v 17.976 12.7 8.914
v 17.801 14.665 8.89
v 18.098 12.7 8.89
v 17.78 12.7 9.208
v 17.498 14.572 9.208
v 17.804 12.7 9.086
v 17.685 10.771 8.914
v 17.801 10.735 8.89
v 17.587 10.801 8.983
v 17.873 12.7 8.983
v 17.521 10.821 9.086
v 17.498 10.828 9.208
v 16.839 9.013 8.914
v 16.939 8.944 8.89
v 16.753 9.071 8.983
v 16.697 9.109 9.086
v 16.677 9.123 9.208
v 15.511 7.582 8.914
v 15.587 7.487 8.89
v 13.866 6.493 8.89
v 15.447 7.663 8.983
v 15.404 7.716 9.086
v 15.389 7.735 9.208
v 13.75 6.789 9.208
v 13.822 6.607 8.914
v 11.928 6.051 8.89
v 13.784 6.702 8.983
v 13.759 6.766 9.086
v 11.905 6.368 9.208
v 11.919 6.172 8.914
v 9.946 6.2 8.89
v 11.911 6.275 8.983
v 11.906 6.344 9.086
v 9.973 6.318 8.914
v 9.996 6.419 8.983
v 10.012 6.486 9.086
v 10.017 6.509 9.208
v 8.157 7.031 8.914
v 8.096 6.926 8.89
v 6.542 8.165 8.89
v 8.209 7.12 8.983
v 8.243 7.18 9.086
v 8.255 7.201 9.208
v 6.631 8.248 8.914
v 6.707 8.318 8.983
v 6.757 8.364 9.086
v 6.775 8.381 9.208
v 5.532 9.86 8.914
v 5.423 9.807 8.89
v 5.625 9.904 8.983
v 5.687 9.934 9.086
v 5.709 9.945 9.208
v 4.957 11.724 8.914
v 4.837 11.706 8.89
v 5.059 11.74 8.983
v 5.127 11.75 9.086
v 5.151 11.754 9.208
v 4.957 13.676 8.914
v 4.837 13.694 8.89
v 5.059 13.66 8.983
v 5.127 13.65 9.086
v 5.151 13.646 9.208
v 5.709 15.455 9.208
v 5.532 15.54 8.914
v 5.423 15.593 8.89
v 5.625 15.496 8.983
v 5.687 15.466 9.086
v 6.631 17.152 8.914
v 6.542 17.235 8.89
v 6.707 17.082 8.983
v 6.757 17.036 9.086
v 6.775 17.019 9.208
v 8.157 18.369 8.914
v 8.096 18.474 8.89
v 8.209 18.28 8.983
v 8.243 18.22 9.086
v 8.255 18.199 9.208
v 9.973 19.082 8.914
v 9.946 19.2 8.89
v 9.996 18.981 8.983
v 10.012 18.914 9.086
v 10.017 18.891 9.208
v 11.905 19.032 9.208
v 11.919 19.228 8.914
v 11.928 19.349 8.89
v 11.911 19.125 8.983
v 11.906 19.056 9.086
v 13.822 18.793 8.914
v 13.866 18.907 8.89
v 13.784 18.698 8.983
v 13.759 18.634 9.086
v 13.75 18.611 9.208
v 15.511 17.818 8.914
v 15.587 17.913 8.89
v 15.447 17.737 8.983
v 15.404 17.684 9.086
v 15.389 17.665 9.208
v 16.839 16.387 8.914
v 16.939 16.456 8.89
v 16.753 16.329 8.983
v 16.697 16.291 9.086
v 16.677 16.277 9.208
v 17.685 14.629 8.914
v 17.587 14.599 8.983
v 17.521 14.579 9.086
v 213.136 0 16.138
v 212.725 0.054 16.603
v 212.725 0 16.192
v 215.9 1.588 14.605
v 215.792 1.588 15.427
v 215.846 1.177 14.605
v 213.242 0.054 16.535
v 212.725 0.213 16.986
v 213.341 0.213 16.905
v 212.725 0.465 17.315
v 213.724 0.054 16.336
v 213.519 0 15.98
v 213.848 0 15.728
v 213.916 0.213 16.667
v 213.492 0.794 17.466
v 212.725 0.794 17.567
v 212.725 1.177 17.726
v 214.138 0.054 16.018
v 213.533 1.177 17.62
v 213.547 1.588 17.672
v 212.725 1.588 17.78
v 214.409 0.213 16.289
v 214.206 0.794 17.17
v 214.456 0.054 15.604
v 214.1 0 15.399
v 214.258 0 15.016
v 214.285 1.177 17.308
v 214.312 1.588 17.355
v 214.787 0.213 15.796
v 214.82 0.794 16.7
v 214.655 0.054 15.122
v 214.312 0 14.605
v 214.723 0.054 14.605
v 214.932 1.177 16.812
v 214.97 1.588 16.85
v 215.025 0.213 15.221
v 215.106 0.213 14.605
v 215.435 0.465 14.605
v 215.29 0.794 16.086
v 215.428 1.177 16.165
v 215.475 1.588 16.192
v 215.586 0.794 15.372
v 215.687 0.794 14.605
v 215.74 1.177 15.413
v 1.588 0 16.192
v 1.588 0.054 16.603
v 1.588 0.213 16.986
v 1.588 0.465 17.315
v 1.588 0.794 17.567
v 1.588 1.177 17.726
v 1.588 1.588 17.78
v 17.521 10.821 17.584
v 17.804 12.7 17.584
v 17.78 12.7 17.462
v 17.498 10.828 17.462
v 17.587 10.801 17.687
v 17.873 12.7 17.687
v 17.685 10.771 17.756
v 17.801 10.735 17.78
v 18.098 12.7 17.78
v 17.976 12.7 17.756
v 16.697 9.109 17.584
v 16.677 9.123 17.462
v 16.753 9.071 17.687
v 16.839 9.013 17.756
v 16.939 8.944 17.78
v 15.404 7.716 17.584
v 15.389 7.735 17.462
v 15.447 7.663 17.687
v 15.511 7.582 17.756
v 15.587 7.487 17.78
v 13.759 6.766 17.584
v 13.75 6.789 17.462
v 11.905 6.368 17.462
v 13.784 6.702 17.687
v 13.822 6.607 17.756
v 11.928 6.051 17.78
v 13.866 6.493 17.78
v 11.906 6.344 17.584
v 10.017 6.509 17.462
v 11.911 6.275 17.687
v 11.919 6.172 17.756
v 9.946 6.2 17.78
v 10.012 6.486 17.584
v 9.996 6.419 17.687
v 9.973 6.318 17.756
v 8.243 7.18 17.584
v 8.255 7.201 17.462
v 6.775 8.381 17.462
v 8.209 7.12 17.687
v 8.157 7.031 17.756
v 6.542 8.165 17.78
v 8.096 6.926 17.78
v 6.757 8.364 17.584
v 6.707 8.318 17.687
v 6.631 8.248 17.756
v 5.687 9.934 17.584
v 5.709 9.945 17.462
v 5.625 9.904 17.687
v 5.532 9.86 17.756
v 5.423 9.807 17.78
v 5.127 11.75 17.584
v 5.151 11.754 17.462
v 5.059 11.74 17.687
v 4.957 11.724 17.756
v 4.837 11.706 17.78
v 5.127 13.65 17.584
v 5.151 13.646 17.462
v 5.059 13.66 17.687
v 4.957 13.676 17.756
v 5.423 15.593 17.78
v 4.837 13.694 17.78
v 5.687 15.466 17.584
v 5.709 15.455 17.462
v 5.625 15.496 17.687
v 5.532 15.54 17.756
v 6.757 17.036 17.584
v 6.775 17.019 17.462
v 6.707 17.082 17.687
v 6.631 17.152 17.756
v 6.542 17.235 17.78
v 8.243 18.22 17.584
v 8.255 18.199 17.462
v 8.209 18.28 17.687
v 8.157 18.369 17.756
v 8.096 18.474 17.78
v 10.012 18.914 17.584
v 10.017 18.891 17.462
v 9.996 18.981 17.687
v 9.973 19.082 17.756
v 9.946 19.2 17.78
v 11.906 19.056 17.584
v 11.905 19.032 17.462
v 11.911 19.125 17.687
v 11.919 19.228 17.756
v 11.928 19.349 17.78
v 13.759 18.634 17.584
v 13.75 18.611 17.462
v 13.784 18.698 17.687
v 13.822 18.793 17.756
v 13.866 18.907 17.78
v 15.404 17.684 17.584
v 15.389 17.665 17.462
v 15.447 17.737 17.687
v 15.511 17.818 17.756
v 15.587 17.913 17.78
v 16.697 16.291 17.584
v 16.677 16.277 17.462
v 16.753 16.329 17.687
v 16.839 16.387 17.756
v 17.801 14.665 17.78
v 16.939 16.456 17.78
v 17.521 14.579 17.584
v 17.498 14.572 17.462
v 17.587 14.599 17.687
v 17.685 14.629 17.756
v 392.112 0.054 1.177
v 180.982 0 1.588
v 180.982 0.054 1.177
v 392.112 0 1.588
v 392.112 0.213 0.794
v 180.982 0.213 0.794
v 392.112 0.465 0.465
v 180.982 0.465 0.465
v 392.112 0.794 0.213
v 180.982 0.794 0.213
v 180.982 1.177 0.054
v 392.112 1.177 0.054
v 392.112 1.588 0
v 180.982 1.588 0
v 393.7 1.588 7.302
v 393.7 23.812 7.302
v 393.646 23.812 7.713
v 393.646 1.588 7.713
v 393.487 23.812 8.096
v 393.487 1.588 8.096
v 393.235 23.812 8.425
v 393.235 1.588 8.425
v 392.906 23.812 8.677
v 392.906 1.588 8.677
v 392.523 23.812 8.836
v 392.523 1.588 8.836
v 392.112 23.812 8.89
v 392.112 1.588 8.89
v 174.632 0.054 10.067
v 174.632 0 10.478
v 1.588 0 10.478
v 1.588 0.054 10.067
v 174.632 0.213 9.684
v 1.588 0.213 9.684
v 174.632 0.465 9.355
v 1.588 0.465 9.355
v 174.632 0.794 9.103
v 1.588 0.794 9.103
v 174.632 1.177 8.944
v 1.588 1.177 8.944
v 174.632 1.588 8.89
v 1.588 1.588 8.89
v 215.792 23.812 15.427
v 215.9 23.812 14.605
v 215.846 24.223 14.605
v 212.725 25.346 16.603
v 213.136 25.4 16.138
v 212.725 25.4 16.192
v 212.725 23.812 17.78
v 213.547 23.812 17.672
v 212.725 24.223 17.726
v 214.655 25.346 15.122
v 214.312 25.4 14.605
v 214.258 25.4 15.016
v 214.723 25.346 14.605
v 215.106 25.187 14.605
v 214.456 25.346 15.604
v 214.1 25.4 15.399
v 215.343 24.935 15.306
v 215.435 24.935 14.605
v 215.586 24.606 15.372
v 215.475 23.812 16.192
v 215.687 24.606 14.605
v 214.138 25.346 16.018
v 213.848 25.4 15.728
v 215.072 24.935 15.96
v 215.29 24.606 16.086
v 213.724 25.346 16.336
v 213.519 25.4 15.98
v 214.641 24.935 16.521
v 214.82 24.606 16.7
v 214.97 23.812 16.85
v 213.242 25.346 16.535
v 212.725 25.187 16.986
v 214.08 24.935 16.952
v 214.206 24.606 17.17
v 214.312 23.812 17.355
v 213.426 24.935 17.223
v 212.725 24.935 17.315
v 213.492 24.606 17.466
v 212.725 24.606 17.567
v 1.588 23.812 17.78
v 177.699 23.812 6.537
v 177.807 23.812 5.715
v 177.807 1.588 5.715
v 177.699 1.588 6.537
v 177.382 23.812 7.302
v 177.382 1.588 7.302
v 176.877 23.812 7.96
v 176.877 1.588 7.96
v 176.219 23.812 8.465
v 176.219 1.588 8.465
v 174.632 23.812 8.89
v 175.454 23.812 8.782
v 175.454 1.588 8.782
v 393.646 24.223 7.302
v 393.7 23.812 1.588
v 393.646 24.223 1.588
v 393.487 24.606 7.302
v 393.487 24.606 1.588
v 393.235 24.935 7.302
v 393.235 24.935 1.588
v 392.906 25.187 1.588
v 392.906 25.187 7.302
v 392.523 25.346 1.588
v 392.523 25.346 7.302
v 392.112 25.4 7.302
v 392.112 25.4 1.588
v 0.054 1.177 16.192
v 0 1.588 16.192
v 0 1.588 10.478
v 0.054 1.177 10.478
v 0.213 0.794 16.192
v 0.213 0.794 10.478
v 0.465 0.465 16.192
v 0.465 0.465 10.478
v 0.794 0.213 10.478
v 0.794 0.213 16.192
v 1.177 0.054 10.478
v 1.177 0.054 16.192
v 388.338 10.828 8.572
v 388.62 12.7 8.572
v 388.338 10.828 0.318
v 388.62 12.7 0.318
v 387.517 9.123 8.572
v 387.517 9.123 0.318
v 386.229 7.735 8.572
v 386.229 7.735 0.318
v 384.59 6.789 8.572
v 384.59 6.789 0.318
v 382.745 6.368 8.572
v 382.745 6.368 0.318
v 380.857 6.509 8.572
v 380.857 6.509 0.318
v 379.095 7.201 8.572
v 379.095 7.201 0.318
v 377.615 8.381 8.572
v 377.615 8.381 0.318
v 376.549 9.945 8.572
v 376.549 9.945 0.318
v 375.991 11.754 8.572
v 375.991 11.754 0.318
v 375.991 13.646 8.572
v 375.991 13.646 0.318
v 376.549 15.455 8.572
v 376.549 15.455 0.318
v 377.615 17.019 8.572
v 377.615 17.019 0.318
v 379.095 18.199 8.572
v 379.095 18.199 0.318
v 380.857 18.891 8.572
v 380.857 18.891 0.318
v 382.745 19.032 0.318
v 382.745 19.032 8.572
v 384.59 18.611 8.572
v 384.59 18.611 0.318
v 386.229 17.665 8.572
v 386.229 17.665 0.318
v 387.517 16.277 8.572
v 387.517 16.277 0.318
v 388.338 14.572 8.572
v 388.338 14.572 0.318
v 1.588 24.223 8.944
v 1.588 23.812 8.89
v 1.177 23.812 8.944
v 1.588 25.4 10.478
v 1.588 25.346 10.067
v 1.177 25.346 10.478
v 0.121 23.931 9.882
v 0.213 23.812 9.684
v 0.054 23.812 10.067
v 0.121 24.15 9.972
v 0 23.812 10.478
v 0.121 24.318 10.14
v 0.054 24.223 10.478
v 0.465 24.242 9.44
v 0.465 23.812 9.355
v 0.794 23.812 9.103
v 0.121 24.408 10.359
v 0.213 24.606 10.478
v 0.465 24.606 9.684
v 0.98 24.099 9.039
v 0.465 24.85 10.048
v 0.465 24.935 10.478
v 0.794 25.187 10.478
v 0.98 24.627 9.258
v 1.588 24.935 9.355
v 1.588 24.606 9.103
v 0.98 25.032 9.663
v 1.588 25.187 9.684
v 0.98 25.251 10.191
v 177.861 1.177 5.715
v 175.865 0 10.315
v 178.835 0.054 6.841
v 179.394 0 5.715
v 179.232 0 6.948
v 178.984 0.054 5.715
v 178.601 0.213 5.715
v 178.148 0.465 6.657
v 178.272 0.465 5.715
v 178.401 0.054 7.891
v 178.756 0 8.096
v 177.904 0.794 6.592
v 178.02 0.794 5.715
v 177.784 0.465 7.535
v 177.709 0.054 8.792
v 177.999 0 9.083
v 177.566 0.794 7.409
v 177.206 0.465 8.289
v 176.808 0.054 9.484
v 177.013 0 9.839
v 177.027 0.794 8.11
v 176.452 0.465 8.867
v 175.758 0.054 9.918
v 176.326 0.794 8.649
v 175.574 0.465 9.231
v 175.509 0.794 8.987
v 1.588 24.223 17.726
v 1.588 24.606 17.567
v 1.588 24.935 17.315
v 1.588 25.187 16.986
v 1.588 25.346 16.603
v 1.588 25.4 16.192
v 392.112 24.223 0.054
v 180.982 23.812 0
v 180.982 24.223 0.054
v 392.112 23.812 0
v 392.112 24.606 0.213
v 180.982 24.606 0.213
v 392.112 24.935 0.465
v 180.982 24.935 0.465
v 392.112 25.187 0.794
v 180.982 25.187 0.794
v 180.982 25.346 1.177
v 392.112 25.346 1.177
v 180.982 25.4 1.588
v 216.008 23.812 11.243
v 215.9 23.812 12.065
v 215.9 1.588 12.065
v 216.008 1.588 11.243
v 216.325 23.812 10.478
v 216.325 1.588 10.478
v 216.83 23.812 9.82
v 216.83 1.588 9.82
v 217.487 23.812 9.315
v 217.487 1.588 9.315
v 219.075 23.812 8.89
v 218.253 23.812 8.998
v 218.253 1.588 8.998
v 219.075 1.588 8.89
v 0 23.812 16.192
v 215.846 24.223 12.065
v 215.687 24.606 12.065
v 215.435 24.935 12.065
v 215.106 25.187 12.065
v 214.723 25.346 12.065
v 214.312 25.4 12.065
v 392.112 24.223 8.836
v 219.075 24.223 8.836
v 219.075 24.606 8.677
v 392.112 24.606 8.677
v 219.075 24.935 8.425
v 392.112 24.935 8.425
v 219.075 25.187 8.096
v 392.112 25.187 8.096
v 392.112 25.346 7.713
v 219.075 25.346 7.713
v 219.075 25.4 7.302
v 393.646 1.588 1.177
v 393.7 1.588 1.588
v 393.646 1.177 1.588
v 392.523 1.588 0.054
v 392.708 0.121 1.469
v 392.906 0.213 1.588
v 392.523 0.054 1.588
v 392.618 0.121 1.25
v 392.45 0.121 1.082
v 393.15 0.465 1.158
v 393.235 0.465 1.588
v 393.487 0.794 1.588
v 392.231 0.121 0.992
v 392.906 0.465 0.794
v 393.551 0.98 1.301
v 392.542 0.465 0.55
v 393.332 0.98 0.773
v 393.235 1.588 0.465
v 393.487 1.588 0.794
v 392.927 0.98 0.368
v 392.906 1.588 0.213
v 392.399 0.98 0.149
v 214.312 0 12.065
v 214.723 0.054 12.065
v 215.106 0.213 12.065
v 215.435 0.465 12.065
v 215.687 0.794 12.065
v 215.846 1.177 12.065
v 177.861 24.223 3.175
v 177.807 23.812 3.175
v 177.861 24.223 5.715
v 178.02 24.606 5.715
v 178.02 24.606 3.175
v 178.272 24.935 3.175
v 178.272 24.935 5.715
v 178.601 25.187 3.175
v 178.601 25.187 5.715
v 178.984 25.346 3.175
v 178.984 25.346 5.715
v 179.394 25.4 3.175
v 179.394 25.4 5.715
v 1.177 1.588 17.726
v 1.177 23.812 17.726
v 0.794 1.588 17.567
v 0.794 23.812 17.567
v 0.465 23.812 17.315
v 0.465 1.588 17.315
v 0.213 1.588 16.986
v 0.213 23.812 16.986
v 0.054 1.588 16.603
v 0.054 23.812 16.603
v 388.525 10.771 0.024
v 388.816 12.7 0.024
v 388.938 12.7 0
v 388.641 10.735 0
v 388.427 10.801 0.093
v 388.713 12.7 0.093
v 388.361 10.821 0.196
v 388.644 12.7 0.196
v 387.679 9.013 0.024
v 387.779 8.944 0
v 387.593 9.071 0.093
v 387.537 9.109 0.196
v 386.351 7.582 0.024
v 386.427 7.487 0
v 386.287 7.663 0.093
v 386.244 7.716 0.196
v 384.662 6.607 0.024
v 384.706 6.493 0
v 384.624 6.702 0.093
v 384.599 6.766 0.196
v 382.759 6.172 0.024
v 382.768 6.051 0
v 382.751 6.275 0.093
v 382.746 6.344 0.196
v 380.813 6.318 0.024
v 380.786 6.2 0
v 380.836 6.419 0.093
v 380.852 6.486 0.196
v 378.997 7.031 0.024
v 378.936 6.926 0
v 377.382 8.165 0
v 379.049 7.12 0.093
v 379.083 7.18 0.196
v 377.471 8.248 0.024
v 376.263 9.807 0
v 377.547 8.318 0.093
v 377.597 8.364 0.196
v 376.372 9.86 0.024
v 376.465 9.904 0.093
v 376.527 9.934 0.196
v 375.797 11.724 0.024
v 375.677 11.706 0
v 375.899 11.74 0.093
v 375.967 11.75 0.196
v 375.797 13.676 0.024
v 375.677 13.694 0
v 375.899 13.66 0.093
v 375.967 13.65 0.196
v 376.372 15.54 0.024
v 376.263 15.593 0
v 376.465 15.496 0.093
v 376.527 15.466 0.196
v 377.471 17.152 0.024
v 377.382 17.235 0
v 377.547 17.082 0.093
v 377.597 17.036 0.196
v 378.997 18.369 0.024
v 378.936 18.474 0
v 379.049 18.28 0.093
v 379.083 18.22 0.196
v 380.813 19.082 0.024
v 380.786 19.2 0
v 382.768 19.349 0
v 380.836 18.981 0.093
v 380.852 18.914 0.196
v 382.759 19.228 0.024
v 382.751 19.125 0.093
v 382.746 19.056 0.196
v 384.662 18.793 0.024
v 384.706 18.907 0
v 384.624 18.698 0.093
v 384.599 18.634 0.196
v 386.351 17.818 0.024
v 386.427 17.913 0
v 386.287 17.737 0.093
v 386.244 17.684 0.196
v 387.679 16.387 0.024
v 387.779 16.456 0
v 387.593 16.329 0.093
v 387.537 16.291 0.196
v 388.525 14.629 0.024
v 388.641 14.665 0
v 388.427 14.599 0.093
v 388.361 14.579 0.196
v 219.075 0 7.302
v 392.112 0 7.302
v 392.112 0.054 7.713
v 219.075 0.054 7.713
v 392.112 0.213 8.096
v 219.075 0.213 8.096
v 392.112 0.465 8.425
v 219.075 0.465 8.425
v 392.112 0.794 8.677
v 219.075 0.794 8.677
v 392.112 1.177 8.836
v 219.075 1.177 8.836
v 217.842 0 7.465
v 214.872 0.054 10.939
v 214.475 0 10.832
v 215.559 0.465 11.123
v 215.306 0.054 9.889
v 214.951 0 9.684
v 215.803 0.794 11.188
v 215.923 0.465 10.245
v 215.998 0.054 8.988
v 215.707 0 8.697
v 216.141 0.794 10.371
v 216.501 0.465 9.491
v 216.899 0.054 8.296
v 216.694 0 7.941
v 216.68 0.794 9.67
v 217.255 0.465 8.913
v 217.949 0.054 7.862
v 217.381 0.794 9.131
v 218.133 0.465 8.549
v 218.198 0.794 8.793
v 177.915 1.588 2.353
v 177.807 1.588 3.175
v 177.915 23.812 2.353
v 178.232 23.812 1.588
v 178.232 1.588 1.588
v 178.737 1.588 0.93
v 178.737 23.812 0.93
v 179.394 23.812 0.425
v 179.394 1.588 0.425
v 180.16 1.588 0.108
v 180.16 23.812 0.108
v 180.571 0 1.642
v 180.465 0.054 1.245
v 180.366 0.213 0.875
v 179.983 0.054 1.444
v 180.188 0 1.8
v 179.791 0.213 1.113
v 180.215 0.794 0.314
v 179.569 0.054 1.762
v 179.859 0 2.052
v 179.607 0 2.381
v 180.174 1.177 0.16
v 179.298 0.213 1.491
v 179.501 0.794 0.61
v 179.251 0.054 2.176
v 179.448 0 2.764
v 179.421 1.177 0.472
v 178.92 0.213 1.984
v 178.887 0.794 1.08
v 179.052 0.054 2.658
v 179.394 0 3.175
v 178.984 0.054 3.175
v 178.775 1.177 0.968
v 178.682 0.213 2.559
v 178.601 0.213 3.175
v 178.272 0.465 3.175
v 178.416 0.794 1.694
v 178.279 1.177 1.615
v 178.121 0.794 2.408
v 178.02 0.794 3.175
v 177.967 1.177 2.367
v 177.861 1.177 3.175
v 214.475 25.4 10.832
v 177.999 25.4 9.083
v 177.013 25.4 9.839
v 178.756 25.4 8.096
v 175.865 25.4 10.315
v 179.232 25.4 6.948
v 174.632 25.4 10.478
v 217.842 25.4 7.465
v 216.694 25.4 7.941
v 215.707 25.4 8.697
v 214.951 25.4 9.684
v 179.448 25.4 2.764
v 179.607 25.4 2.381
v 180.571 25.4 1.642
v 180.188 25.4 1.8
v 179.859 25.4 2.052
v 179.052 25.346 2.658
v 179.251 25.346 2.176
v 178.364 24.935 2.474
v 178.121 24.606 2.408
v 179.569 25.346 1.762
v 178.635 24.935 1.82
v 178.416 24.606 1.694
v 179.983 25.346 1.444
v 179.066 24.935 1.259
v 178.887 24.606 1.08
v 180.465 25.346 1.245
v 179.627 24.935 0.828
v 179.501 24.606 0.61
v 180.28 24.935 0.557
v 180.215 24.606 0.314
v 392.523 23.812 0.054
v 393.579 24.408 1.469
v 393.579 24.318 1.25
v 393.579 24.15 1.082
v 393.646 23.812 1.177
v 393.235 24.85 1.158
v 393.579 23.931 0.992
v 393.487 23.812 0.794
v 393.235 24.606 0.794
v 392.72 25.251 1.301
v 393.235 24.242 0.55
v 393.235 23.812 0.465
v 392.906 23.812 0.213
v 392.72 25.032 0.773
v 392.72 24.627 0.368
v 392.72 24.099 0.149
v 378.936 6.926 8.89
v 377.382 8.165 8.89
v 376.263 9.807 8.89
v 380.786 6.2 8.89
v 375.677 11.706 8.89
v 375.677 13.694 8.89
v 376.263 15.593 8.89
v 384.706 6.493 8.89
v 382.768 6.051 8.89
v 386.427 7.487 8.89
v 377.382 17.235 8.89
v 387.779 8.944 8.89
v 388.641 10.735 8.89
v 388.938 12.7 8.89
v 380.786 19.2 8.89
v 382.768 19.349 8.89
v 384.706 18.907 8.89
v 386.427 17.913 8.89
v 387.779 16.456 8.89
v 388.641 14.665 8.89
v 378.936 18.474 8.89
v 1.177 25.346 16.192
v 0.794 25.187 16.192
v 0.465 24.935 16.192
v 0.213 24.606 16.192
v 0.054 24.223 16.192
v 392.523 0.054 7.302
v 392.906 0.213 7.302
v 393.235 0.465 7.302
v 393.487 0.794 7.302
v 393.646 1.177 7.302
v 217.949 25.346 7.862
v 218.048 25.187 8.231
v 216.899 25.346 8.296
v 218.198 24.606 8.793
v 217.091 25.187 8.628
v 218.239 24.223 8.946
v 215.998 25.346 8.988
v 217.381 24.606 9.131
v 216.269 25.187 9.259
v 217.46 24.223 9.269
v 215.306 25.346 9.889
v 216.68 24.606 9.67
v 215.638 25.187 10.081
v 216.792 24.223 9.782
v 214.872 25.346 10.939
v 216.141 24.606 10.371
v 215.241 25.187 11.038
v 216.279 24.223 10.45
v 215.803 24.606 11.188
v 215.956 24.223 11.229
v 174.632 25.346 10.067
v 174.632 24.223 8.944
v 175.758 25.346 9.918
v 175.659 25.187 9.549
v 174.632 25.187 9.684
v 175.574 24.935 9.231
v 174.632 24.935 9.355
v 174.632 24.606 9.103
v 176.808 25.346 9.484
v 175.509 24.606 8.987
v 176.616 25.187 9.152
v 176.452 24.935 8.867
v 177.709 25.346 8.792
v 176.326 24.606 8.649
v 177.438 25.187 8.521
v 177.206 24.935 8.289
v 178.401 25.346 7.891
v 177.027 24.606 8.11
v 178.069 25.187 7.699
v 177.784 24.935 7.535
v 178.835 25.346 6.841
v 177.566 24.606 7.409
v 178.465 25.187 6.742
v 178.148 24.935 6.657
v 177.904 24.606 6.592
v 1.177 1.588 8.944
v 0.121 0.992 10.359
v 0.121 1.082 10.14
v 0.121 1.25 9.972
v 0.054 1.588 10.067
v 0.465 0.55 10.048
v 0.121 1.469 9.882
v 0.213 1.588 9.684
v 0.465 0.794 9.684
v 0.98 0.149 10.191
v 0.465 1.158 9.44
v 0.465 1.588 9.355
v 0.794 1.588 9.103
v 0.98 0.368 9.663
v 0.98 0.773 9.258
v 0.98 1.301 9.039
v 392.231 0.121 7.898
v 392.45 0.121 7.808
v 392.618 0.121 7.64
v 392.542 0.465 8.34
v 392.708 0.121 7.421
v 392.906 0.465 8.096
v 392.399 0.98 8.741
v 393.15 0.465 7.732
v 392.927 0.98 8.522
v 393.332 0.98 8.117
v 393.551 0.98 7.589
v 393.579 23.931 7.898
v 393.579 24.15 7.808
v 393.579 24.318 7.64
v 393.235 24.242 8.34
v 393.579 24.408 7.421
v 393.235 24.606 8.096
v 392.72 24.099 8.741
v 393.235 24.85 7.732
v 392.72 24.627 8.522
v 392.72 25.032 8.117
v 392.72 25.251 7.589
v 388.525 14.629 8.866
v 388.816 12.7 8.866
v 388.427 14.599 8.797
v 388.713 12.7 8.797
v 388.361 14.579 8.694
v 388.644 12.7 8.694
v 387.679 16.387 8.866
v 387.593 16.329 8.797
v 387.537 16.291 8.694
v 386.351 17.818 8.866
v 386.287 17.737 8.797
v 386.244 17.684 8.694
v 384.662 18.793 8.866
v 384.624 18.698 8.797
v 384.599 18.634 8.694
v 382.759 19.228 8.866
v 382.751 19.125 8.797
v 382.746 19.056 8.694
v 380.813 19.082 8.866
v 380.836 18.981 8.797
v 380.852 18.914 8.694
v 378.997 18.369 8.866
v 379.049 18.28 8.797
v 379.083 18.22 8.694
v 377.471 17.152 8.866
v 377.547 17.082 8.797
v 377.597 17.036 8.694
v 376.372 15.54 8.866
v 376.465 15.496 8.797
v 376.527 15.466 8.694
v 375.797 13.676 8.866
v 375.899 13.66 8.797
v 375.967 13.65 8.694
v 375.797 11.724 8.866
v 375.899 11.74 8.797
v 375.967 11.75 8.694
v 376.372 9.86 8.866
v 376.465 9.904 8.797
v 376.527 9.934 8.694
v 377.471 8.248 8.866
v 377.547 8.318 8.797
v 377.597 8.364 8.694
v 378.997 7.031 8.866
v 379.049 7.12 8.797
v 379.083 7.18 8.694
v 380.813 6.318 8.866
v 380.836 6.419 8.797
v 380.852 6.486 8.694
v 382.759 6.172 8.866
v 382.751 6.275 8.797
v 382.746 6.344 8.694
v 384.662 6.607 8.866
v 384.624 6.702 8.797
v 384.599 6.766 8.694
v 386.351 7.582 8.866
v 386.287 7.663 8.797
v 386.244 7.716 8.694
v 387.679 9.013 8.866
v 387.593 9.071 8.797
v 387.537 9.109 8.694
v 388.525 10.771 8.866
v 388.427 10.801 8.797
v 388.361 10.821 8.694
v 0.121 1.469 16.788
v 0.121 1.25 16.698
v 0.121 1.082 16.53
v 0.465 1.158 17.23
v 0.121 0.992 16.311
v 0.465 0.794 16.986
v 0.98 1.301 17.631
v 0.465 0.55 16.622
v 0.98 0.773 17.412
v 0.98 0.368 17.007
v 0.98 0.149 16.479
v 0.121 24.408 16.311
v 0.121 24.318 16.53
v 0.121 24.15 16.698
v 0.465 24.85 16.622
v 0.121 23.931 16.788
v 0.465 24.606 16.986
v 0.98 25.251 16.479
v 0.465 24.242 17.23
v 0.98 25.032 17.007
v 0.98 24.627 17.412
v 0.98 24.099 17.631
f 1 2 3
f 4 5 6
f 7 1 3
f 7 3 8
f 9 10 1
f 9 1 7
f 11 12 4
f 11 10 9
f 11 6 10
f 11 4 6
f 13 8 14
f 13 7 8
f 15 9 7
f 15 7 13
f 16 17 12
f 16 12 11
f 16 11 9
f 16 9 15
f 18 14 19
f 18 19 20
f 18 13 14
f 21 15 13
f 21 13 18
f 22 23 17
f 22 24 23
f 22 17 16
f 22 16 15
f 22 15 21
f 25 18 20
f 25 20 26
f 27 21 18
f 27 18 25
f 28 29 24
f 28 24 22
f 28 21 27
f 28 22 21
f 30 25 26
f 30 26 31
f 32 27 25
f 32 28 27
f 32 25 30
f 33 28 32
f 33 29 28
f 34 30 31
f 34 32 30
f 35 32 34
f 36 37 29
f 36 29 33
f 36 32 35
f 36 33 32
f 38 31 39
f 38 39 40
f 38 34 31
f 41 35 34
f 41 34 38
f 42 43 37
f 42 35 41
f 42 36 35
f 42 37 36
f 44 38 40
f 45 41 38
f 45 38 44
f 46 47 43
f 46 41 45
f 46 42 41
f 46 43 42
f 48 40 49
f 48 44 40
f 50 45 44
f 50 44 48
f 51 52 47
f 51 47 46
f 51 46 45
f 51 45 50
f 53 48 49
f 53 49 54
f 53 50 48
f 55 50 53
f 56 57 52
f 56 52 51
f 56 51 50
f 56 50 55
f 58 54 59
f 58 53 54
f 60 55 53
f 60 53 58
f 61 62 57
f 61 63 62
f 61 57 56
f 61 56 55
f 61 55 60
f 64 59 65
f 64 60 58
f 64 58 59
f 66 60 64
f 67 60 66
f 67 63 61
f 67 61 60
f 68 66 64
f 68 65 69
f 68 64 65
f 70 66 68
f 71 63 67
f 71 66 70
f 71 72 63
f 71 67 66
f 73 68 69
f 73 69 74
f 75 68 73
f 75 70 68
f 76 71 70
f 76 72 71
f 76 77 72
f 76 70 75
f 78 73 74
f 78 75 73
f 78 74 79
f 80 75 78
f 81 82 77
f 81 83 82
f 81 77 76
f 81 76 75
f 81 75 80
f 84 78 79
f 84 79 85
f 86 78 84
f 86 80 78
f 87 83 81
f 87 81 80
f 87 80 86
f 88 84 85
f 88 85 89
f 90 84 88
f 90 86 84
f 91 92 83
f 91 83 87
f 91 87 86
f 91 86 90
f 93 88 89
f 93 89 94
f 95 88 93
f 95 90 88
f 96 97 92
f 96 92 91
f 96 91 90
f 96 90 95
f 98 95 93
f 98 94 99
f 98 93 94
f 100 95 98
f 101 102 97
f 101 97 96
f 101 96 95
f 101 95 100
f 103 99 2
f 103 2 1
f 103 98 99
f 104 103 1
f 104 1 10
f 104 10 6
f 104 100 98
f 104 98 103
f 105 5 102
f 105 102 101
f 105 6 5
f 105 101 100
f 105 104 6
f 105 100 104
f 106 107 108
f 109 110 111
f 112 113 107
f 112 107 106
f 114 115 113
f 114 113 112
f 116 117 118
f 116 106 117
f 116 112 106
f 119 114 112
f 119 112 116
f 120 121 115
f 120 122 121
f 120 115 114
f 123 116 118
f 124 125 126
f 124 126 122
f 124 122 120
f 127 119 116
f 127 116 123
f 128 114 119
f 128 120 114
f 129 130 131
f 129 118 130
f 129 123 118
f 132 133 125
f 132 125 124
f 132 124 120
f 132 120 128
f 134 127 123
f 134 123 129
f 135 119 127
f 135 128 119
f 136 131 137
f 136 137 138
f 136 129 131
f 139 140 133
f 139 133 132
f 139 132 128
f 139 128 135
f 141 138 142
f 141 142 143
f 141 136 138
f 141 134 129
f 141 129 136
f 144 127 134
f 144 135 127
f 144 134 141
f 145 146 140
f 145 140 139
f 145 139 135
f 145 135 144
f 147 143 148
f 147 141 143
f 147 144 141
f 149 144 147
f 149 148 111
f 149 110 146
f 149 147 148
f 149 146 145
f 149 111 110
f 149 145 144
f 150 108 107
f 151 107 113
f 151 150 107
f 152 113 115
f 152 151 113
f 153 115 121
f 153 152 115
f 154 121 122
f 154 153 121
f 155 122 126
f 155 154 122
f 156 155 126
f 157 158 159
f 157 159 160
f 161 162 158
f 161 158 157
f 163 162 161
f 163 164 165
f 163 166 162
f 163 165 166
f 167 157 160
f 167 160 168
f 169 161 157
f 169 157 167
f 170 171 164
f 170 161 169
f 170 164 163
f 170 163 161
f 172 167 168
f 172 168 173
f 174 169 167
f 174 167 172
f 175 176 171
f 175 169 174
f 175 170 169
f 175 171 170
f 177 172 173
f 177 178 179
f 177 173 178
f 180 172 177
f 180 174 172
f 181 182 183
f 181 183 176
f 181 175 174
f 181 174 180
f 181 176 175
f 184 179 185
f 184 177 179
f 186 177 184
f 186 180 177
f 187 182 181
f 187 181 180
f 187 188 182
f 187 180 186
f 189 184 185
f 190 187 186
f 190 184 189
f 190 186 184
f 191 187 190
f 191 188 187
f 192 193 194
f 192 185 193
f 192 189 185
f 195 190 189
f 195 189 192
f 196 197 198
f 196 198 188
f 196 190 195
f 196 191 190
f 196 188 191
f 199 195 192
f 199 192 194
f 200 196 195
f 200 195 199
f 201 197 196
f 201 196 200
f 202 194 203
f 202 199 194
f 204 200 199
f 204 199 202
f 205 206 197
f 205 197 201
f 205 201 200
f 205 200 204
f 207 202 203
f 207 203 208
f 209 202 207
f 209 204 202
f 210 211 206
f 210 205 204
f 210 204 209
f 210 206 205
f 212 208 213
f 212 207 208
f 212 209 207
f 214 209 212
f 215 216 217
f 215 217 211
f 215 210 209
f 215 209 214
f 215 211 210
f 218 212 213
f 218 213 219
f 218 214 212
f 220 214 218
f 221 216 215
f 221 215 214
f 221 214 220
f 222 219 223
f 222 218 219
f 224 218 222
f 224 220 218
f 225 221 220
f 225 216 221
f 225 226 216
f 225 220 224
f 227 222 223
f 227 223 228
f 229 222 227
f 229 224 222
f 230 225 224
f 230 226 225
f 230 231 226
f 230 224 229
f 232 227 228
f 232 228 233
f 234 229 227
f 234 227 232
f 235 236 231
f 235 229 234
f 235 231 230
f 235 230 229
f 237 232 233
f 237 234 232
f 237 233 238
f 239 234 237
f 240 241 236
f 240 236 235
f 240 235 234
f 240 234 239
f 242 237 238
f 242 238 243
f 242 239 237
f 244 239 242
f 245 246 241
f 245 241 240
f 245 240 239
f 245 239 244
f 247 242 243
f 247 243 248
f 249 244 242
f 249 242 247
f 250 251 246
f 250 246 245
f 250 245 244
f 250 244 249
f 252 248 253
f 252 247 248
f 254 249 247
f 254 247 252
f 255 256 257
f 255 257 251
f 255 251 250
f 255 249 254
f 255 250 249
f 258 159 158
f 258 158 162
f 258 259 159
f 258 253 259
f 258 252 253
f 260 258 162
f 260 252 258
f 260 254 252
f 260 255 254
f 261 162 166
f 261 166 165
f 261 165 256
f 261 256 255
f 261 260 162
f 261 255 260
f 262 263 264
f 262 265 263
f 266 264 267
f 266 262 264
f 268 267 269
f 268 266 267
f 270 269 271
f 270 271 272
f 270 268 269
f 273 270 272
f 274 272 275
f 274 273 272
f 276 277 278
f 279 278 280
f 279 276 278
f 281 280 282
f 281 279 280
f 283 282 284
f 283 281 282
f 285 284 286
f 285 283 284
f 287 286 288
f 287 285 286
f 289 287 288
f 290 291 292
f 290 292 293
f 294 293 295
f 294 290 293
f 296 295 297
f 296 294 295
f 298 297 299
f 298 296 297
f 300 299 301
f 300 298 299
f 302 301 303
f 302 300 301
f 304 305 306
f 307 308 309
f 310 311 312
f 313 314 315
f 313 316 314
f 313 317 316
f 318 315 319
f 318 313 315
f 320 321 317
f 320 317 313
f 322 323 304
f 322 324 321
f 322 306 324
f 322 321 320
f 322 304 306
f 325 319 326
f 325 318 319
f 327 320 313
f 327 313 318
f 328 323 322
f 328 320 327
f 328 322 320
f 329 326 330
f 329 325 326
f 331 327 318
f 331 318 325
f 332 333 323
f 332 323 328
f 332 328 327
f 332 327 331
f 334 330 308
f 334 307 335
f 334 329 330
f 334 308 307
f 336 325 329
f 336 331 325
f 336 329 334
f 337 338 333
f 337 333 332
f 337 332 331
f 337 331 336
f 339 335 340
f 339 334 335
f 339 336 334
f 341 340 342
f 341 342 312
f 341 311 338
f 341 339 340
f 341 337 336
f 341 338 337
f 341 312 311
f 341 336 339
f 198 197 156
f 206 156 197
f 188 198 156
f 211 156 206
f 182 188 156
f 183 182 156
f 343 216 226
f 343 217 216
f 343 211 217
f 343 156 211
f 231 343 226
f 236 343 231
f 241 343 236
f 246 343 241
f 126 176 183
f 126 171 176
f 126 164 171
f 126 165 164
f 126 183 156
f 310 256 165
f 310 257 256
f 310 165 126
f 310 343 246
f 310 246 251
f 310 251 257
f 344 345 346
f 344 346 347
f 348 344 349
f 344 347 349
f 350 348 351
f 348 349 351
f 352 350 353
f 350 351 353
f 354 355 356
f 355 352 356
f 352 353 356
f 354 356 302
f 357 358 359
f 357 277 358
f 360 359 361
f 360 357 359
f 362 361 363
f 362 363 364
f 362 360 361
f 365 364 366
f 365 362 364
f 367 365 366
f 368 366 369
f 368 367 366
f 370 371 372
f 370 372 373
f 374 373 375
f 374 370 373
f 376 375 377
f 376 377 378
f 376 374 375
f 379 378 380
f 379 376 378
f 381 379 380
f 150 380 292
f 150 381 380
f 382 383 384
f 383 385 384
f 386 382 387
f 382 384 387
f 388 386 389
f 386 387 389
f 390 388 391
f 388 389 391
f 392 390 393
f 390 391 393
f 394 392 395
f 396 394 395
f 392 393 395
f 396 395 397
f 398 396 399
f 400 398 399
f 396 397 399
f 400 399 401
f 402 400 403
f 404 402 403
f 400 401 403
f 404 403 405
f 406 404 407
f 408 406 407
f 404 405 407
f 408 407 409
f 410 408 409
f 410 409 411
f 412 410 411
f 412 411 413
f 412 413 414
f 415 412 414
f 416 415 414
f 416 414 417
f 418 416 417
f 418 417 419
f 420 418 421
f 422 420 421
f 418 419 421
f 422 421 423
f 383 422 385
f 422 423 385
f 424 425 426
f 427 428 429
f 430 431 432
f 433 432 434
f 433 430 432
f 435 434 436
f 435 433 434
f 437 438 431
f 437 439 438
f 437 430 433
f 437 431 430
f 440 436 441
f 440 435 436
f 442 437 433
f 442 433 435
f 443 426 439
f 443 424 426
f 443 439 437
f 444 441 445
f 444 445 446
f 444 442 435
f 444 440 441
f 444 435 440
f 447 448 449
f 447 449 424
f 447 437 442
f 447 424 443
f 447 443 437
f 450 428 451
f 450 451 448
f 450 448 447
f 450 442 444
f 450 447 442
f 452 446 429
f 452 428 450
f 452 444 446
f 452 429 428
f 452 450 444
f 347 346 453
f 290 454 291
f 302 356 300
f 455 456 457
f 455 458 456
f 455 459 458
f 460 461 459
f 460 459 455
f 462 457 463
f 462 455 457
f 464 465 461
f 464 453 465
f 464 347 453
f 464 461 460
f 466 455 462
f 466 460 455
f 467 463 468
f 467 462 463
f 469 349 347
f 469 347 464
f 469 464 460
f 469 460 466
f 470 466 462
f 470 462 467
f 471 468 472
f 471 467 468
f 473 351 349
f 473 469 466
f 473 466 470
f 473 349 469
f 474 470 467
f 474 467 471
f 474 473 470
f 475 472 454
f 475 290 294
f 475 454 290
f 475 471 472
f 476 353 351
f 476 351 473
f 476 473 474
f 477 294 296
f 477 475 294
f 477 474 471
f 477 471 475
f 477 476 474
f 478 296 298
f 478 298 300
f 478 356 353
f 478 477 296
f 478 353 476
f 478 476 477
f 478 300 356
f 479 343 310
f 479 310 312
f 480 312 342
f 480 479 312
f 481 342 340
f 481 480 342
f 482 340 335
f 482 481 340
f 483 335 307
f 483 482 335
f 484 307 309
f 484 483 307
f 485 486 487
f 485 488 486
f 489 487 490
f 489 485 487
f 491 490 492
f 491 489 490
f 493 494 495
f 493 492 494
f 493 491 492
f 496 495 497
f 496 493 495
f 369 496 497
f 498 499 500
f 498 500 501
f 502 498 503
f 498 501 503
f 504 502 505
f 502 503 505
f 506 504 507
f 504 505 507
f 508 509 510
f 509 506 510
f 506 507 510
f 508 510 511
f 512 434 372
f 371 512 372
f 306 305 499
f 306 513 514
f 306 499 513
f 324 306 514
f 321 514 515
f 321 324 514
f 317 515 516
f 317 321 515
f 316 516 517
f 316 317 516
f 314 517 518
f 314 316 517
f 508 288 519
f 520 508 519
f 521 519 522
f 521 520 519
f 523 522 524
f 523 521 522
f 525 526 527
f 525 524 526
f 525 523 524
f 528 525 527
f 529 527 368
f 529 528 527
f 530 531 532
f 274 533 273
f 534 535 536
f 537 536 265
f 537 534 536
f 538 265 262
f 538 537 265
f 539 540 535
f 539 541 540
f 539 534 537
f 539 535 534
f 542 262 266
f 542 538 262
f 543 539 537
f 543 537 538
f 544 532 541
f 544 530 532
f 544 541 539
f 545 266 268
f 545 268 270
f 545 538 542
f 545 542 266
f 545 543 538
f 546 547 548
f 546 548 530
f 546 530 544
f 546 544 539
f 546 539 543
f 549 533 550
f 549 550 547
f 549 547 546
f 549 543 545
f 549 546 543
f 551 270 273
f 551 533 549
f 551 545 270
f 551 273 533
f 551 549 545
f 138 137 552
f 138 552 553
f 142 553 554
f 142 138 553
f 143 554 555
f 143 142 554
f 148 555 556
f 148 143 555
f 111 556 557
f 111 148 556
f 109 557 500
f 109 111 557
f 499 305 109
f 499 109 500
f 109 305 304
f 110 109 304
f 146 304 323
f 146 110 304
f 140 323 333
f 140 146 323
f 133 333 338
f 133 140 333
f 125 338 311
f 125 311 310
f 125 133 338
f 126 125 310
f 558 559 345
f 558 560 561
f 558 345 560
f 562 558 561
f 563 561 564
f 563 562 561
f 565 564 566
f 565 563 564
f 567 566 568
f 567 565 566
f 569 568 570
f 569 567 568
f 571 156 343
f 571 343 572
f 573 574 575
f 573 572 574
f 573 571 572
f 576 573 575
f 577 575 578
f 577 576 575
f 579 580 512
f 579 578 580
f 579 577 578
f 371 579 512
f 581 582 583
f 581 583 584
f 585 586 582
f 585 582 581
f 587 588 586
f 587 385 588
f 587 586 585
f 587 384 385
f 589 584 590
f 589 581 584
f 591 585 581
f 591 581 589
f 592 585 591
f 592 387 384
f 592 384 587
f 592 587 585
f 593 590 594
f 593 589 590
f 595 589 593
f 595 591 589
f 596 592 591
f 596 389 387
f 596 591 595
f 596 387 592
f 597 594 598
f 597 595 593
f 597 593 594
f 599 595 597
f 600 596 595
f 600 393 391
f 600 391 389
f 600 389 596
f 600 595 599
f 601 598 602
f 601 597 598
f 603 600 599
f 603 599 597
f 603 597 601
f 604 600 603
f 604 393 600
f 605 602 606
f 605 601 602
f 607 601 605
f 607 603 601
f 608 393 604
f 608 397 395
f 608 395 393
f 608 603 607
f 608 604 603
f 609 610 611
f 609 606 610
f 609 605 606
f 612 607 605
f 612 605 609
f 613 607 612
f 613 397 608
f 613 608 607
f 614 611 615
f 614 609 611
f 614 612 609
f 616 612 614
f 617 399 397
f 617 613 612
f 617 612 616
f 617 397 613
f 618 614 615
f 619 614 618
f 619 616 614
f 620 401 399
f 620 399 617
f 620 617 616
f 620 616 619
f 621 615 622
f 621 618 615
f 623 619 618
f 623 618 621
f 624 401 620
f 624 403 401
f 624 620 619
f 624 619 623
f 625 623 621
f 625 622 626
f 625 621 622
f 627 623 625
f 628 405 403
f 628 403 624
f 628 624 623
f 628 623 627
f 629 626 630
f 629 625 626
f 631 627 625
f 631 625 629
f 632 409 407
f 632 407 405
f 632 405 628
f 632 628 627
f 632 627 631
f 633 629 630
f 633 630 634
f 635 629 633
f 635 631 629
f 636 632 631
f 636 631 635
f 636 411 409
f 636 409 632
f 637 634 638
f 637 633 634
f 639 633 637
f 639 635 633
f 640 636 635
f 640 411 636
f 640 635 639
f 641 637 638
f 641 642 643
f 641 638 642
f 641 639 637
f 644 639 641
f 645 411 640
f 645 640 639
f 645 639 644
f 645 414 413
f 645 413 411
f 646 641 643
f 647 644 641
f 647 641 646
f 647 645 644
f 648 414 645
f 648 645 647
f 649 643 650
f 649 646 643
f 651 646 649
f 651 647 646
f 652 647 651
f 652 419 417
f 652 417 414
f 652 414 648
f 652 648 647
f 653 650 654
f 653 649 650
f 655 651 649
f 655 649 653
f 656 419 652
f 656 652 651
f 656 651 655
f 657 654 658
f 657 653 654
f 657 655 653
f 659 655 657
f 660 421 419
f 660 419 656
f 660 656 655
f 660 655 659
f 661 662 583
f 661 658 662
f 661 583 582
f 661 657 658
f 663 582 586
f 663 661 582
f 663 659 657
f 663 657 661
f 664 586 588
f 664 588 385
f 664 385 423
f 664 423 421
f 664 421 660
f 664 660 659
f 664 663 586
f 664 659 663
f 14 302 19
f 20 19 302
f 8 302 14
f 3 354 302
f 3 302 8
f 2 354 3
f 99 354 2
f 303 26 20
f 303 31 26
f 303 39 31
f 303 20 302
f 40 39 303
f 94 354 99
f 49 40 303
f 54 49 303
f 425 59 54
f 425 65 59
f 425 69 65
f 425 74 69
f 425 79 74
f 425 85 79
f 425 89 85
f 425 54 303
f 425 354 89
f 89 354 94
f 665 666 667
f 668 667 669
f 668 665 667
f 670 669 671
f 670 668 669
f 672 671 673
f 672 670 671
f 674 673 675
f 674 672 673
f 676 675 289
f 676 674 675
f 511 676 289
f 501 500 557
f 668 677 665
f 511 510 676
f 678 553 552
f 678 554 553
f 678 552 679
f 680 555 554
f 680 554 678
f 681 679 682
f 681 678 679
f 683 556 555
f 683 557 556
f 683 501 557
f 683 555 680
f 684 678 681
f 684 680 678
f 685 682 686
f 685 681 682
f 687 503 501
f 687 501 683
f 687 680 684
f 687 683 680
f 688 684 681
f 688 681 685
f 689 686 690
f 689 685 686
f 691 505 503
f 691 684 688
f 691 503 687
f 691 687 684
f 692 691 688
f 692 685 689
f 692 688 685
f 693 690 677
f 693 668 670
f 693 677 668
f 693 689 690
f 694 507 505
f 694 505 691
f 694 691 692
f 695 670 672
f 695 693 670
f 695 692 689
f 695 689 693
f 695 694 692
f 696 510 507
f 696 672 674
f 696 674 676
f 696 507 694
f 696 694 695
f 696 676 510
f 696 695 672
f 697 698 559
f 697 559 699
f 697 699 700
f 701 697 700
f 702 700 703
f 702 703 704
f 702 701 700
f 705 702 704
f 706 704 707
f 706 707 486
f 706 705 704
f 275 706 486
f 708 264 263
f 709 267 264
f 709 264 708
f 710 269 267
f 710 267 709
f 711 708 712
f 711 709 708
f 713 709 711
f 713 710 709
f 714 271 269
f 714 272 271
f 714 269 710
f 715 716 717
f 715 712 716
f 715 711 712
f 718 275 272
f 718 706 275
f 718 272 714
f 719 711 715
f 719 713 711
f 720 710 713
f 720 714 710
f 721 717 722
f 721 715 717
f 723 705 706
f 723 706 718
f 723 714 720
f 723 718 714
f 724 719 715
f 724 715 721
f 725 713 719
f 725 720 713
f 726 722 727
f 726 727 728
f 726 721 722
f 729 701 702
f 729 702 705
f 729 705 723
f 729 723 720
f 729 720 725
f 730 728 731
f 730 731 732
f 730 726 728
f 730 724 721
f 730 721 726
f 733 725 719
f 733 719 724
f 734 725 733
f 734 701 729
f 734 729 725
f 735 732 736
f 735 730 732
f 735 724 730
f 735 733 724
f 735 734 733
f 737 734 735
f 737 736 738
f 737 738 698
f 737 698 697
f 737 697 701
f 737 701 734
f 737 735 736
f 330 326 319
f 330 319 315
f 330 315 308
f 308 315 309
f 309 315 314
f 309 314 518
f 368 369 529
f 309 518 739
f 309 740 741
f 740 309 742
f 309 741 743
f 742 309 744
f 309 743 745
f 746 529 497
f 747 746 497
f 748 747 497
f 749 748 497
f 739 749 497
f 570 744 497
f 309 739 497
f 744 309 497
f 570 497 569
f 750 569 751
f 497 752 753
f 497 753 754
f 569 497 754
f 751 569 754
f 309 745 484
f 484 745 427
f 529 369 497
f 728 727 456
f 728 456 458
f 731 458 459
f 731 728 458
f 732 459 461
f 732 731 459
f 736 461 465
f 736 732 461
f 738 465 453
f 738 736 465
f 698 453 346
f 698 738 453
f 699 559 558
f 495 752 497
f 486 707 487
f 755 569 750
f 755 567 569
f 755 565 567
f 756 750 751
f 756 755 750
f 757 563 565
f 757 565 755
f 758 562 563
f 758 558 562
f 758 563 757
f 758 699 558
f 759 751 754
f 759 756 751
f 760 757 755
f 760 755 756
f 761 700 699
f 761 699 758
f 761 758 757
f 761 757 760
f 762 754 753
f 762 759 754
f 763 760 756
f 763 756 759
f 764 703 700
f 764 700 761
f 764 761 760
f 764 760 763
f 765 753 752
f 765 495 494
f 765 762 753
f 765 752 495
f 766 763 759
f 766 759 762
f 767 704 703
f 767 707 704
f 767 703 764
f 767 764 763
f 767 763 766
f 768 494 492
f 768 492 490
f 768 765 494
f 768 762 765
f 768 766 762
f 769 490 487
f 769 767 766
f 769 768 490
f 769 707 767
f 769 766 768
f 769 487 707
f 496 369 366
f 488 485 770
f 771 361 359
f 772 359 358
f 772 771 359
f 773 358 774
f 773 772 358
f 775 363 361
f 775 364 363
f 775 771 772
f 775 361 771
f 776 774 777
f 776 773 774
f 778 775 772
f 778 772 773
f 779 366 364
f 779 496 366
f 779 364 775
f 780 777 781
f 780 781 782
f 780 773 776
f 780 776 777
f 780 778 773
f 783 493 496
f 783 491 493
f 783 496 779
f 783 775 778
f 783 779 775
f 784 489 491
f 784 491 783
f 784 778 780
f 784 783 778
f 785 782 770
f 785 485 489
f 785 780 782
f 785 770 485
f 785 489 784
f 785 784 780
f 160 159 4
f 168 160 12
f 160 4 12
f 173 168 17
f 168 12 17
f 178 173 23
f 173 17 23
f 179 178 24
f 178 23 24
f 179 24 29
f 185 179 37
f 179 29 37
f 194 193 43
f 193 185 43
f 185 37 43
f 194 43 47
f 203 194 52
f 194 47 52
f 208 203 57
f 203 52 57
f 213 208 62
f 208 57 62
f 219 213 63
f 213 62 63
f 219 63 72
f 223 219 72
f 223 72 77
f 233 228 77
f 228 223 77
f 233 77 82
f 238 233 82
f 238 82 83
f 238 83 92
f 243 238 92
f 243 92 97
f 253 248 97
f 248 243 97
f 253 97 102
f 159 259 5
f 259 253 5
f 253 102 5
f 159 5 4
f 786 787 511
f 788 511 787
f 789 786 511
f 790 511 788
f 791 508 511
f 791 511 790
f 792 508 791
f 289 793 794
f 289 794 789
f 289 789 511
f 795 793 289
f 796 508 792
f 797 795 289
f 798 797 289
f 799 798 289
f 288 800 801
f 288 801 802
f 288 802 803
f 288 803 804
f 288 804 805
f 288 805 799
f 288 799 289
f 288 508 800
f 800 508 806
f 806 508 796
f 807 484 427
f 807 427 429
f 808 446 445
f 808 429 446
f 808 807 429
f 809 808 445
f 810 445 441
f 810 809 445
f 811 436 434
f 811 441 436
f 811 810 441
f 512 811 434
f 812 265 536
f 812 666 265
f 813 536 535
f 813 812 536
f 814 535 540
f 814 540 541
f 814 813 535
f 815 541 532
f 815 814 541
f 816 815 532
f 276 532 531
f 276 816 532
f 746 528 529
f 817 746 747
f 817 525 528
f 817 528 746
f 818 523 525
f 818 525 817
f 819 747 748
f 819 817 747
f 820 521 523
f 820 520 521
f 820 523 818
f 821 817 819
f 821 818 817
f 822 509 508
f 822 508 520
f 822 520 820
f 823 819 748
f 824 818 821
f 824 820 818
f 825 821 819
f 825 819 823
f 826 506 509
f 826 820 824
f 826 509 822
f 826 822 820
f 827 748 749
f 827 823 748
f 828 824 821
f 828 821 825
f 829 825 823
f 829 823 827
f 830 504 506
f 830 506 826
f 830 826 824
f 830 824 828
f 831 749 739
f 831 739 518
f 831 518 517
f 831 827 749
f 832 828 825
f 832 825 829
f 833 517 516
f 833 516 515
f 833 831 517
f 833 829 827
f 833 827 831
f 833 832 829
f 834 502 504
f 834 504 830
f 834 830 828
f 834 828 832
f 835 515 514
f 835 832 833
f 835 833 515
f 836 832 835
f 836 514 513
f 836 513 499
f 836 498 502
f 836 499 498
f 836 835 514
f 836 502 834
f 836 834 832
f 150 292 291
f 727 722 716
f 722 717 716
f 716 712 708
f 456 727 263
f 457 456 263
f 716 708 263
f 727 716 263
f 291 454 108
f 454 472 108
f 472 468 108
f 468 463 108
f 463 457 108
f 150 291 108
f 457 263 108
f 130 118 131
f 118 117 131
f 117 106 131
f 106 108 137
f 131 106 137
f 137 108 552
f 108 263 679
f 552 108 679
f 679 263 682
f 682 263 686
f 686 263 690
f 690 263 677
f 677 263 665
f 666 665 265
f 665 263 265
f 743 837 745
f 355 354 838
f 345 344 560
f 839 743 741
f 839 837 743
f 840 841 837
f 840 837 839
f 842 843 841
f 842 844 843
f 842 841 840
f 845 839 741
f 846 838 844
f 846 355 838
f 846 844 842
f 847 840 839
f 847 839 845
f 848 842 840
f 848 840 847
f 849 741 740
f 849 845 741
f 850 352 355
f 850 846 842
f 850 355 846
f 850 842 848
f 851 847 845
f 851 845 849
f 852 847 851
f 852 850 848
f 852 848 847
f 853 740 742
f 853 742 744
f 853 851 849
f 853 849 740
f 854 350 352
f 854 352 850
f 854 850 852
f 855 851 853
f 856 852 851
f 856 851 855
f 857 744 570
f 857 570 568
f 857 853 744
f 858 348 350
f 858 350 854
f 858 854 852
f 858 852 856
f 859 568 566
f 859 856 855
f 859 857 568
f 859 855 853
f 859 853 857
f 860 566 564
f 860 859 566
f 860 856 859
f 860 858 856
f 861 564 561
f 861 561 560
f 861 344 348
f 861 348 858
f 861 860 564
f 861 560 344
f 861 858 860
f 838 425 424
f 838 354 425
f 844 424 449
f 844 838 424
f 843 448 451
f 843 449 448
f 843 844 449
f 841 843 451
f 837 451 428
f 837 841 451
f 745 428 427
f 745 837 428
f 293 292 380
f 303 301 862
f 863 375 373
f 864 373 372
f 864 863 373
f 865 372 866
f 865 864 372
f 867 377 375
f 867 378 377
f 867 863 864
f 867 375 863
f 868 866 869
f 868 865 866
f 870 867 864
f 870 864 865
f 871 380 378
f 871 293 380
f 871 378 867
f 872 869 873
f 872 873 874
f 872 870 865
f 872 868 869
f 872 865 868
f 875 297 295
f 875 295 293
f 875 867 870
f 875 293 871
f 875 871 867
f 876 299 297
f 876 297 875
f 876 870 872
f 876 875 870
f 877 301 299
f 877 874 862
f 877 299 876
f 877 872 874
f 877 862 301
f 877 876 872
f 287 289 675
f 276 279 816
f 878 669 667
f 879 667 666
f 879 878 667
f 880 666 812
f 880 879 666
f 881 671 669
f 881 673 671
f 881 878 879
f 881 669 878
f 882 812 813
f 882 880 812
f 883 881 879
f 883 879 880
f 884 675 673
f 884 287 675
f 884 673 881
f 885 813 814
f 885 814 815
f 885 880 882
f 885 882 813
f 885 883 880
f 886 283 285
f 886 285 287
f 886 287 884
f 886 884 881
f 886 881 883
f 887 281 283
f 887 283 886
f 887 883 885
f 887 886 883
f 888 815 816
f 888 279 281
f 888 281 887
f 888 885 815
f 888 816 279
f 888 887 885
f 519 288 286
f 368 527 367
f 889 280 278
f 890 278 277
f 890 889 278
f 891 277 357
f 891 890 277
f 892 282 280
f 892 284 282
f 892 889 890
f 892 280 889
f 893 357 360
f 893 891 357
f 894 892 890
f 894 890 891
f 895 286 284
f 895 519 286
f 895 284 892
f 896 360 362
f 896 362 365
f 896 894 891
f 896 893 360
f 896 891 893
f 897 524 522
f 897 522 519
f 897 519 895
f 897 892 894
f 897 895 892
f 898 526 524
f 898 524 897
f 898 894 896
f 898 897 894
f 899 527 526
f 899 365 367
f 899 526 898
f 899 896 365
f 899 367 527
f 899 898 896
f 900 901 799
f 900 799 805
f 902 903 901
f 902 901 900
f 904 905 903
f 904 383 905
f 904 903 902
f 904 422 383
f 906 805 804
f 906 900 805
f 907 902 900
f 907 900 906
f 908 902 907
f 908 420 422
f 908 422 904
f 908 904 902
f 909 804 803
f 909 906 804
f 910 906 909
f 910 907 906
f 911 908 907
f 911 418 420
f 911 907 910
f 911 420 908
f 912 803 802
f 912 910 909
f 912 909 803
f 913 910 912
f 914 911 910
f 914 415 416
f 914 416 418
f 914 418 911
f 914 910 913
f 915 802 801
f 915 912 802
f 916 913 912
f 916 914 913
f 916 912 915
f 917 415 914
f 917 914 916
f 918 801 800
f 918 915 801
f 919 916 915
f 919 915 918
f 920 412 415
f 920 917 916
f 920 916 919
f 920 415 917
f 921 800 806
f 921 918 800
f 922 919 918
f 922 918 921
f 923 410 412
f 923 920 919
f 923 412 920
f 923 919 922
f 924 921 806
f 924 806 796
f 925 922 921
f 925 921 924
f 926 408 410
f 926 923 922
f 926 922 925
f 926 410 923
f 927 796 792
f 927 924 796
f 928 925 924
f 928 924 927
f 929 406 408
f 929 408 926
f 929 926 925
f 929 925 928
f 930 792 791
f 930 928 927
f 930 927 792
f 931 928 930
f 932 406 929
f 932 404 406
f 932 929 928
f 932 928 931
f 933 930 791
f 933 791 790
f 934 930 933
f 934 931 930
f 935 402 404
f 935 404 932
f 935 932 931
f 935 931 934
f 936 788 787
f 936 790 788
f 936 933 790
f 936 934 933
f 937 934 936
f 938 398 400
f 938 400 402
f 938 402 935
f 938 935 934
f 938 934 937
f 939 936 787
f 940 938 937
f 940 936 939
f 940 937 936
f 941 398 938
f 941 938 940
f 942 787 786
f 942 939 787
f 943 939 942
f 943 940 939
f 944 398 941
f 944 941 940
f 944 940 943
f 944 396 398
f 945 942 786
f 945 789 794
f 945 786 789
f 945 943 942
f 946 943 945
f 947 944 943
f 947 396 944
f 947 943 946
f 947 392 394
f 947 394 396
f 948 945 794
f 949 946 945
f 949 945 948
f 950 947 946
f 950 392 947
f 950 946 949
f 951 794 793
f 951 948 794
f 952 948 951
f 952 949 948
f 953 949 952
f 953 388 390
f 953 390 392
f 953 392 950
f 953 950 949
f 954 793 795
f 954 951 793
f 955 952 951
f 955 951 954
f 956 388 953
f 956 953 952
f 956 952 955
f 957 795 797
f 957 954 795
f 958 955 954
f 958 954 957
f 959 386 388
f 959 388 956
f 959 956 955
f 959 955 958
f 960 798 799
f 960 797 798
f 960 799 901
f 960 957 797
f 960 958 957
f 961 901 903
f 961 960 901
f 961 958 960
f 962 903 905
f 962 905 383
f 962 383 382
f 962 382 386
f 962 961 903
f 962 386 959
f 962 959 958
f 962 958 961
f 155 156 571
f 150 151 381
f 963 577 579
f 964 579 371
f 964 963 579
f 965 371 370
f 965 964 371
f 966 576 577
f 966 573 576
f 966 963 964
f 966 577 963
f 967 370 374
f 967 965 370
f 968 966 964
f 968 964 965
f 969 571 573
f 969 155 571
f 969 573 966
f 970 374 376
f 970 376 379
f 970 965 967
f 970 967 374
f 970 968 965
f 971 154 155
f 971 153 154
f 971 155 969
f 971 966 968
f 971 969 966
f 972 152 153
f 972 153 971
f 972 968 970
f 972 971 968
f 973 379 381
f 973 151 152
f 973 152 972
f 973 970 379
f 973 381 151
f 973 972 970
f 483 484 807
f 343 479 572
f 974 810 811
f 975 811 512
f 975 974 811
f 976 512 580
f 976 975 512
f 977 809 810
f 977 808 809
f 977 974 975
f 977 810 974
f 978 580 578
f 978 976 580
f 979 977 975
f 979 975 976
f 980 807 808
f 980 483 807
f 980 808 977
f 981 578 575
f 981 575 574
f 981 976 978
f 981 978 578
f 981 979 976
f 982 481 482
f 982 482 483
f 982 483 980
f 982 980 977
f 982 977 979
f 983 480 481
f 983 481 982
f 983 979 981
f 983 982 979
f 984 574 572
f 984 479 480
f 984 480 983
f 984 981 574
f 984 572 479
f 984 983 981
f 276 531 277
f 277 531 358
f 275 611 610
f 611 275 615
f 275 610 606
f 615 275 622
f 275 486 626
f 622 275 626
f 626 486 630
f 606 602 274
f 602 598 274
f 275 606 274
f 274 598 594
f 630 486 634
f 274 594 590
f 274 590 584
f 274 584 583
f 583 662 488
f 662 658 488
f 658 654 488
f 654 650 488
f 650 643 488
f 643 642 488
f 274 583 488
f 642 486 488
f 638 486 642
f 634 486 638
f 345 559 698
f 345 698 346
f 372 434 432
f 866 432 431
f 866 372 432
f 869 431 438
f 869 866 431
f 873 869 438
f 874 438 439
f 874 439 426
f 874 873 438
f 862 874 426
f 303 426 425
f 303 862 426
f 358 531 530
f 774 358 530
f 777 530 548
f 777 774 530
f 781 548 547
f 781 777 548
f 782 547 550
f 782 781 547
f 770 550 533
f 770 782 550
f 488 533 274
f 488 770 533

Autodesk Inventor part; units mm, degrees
ref_plane "YZ Plane" through (0, 0, 0) normal (1, 0, 0) x (0, 1, 0)
ref_plane "XZ Plane" through (0, 0, 0) normal (0, 1, 0) x (-1, 0, 0)
ref_plane "XY Plane" through (0, 0, 0) normal (0, 0, 1) x (1, 0, 0)
sketch "Sketch1" plane through (0, 0, 0) normal (0, 0, 1) x (1, 0, 0)
  line L0 (0, 0) -> (393.7, 0)
  line L1 (393.7, 0) -> (393.7, 25.4)
  line L2 (393.7, 25.4) -> (0, 25.4)
  line L3 (0, 25.4) -> (0, 0)
  line L4 (0, 12.7) -> (11.43, 12.7) construction
  line L5 (393.7, 12.7) -> (382.27, 12.7) construction
  circle A0 centre (11.43, 12.7) radius 6.35
  circle A1 centre (382.27, 12.7) radius 6.35
  dimension "d0" = 393.7
  dimension "d1" = 25.4
  dimension "d2" = 11.43
  dimension "d3" = 11.43
  dimension "d4" = 12.7
  dimension "d5" = 12.7
extrude "Extrusion1" add sketch "Sketch1" along normal blind 17.78
sketch "Sketch2" plane through (0, 25.4, 0) normal (0, 1, 0) x (1, 0, 0)
  line L0 (0, 0) -> (177.8069, 0)
  line L1 (177.8069, 0) -> (177.8069, -8.89)
  line L2 (177.8069, -8.89) -> (0, -8.89)
  line L3 (0, -8.89) -> (0, 0)
  line L4 (393.7, -17.78) -> (215.9, -17.78)
  line L5 (215.9, -17.78) -> (215.9, -8.89)
  line L6 (215.9, -8.89) -> (393.7, -8.89)
  line L7 (393.7, -8.89) -> (393.7, -17.78)
  dimension "d8" = 177.8
extrude "Extrusion2" cut sketch "Sketch2" against normal blind 50.8
fillet "Fillet1" radius 3.175 4 edges at (215.9, 12.7, 8.89) (215.9, 12.7, 17.78) (177.8069, 12.7, 8.89) (177.8069, 12.7, 0)
fillet "Fillet2" radius 1.5875 28 edges at (178.7368, 25.4, 0.9299) (177.8069, 25.4, 4.445) (176.877, 25.4, 7.9601) (87.3159, 25.4, 8.89) (287.3409, 25.4, 0) (216.8299, 25.4, 9.8199) (215.9, 25.4, 13.335) (214.9701, 25.4, 16.8501) (106.3625, 25.4, 17.78) (306.3875, 25.4, 8.89) (393.7, 25.4, 4.445) (393.7, 12.7, 8.89) (393.7, 12.7, 0) (178.7368, 0, 0.9299) (177.8069, 0, 4.445) (176.877, 0, 7.9601) (87.3159, 0, 8.89) (287.3409, 0, 0) (393.7, 0, 4.445) (216.8299, 0, 9.8199) (215.9, 0, 13.335) (214.9701, 0, 16.8501) (106.3625, 0, 17.78) (306.3875, 0, 8.89) (0, 12.7, 17.78) (0, 25.4, 13.335) (0, 12.7, 8.89) (0, 0, 13.335)
fillet "Fillet3" radius 0.3175 4 edges at (5.08, 12.7, 17.78) (5.08, 12.7, 8.89) (375.92, 12.7, 0) (375.92, 12.7, 8.89)
properties part number "Diagonal Supporter" material "Steel"
